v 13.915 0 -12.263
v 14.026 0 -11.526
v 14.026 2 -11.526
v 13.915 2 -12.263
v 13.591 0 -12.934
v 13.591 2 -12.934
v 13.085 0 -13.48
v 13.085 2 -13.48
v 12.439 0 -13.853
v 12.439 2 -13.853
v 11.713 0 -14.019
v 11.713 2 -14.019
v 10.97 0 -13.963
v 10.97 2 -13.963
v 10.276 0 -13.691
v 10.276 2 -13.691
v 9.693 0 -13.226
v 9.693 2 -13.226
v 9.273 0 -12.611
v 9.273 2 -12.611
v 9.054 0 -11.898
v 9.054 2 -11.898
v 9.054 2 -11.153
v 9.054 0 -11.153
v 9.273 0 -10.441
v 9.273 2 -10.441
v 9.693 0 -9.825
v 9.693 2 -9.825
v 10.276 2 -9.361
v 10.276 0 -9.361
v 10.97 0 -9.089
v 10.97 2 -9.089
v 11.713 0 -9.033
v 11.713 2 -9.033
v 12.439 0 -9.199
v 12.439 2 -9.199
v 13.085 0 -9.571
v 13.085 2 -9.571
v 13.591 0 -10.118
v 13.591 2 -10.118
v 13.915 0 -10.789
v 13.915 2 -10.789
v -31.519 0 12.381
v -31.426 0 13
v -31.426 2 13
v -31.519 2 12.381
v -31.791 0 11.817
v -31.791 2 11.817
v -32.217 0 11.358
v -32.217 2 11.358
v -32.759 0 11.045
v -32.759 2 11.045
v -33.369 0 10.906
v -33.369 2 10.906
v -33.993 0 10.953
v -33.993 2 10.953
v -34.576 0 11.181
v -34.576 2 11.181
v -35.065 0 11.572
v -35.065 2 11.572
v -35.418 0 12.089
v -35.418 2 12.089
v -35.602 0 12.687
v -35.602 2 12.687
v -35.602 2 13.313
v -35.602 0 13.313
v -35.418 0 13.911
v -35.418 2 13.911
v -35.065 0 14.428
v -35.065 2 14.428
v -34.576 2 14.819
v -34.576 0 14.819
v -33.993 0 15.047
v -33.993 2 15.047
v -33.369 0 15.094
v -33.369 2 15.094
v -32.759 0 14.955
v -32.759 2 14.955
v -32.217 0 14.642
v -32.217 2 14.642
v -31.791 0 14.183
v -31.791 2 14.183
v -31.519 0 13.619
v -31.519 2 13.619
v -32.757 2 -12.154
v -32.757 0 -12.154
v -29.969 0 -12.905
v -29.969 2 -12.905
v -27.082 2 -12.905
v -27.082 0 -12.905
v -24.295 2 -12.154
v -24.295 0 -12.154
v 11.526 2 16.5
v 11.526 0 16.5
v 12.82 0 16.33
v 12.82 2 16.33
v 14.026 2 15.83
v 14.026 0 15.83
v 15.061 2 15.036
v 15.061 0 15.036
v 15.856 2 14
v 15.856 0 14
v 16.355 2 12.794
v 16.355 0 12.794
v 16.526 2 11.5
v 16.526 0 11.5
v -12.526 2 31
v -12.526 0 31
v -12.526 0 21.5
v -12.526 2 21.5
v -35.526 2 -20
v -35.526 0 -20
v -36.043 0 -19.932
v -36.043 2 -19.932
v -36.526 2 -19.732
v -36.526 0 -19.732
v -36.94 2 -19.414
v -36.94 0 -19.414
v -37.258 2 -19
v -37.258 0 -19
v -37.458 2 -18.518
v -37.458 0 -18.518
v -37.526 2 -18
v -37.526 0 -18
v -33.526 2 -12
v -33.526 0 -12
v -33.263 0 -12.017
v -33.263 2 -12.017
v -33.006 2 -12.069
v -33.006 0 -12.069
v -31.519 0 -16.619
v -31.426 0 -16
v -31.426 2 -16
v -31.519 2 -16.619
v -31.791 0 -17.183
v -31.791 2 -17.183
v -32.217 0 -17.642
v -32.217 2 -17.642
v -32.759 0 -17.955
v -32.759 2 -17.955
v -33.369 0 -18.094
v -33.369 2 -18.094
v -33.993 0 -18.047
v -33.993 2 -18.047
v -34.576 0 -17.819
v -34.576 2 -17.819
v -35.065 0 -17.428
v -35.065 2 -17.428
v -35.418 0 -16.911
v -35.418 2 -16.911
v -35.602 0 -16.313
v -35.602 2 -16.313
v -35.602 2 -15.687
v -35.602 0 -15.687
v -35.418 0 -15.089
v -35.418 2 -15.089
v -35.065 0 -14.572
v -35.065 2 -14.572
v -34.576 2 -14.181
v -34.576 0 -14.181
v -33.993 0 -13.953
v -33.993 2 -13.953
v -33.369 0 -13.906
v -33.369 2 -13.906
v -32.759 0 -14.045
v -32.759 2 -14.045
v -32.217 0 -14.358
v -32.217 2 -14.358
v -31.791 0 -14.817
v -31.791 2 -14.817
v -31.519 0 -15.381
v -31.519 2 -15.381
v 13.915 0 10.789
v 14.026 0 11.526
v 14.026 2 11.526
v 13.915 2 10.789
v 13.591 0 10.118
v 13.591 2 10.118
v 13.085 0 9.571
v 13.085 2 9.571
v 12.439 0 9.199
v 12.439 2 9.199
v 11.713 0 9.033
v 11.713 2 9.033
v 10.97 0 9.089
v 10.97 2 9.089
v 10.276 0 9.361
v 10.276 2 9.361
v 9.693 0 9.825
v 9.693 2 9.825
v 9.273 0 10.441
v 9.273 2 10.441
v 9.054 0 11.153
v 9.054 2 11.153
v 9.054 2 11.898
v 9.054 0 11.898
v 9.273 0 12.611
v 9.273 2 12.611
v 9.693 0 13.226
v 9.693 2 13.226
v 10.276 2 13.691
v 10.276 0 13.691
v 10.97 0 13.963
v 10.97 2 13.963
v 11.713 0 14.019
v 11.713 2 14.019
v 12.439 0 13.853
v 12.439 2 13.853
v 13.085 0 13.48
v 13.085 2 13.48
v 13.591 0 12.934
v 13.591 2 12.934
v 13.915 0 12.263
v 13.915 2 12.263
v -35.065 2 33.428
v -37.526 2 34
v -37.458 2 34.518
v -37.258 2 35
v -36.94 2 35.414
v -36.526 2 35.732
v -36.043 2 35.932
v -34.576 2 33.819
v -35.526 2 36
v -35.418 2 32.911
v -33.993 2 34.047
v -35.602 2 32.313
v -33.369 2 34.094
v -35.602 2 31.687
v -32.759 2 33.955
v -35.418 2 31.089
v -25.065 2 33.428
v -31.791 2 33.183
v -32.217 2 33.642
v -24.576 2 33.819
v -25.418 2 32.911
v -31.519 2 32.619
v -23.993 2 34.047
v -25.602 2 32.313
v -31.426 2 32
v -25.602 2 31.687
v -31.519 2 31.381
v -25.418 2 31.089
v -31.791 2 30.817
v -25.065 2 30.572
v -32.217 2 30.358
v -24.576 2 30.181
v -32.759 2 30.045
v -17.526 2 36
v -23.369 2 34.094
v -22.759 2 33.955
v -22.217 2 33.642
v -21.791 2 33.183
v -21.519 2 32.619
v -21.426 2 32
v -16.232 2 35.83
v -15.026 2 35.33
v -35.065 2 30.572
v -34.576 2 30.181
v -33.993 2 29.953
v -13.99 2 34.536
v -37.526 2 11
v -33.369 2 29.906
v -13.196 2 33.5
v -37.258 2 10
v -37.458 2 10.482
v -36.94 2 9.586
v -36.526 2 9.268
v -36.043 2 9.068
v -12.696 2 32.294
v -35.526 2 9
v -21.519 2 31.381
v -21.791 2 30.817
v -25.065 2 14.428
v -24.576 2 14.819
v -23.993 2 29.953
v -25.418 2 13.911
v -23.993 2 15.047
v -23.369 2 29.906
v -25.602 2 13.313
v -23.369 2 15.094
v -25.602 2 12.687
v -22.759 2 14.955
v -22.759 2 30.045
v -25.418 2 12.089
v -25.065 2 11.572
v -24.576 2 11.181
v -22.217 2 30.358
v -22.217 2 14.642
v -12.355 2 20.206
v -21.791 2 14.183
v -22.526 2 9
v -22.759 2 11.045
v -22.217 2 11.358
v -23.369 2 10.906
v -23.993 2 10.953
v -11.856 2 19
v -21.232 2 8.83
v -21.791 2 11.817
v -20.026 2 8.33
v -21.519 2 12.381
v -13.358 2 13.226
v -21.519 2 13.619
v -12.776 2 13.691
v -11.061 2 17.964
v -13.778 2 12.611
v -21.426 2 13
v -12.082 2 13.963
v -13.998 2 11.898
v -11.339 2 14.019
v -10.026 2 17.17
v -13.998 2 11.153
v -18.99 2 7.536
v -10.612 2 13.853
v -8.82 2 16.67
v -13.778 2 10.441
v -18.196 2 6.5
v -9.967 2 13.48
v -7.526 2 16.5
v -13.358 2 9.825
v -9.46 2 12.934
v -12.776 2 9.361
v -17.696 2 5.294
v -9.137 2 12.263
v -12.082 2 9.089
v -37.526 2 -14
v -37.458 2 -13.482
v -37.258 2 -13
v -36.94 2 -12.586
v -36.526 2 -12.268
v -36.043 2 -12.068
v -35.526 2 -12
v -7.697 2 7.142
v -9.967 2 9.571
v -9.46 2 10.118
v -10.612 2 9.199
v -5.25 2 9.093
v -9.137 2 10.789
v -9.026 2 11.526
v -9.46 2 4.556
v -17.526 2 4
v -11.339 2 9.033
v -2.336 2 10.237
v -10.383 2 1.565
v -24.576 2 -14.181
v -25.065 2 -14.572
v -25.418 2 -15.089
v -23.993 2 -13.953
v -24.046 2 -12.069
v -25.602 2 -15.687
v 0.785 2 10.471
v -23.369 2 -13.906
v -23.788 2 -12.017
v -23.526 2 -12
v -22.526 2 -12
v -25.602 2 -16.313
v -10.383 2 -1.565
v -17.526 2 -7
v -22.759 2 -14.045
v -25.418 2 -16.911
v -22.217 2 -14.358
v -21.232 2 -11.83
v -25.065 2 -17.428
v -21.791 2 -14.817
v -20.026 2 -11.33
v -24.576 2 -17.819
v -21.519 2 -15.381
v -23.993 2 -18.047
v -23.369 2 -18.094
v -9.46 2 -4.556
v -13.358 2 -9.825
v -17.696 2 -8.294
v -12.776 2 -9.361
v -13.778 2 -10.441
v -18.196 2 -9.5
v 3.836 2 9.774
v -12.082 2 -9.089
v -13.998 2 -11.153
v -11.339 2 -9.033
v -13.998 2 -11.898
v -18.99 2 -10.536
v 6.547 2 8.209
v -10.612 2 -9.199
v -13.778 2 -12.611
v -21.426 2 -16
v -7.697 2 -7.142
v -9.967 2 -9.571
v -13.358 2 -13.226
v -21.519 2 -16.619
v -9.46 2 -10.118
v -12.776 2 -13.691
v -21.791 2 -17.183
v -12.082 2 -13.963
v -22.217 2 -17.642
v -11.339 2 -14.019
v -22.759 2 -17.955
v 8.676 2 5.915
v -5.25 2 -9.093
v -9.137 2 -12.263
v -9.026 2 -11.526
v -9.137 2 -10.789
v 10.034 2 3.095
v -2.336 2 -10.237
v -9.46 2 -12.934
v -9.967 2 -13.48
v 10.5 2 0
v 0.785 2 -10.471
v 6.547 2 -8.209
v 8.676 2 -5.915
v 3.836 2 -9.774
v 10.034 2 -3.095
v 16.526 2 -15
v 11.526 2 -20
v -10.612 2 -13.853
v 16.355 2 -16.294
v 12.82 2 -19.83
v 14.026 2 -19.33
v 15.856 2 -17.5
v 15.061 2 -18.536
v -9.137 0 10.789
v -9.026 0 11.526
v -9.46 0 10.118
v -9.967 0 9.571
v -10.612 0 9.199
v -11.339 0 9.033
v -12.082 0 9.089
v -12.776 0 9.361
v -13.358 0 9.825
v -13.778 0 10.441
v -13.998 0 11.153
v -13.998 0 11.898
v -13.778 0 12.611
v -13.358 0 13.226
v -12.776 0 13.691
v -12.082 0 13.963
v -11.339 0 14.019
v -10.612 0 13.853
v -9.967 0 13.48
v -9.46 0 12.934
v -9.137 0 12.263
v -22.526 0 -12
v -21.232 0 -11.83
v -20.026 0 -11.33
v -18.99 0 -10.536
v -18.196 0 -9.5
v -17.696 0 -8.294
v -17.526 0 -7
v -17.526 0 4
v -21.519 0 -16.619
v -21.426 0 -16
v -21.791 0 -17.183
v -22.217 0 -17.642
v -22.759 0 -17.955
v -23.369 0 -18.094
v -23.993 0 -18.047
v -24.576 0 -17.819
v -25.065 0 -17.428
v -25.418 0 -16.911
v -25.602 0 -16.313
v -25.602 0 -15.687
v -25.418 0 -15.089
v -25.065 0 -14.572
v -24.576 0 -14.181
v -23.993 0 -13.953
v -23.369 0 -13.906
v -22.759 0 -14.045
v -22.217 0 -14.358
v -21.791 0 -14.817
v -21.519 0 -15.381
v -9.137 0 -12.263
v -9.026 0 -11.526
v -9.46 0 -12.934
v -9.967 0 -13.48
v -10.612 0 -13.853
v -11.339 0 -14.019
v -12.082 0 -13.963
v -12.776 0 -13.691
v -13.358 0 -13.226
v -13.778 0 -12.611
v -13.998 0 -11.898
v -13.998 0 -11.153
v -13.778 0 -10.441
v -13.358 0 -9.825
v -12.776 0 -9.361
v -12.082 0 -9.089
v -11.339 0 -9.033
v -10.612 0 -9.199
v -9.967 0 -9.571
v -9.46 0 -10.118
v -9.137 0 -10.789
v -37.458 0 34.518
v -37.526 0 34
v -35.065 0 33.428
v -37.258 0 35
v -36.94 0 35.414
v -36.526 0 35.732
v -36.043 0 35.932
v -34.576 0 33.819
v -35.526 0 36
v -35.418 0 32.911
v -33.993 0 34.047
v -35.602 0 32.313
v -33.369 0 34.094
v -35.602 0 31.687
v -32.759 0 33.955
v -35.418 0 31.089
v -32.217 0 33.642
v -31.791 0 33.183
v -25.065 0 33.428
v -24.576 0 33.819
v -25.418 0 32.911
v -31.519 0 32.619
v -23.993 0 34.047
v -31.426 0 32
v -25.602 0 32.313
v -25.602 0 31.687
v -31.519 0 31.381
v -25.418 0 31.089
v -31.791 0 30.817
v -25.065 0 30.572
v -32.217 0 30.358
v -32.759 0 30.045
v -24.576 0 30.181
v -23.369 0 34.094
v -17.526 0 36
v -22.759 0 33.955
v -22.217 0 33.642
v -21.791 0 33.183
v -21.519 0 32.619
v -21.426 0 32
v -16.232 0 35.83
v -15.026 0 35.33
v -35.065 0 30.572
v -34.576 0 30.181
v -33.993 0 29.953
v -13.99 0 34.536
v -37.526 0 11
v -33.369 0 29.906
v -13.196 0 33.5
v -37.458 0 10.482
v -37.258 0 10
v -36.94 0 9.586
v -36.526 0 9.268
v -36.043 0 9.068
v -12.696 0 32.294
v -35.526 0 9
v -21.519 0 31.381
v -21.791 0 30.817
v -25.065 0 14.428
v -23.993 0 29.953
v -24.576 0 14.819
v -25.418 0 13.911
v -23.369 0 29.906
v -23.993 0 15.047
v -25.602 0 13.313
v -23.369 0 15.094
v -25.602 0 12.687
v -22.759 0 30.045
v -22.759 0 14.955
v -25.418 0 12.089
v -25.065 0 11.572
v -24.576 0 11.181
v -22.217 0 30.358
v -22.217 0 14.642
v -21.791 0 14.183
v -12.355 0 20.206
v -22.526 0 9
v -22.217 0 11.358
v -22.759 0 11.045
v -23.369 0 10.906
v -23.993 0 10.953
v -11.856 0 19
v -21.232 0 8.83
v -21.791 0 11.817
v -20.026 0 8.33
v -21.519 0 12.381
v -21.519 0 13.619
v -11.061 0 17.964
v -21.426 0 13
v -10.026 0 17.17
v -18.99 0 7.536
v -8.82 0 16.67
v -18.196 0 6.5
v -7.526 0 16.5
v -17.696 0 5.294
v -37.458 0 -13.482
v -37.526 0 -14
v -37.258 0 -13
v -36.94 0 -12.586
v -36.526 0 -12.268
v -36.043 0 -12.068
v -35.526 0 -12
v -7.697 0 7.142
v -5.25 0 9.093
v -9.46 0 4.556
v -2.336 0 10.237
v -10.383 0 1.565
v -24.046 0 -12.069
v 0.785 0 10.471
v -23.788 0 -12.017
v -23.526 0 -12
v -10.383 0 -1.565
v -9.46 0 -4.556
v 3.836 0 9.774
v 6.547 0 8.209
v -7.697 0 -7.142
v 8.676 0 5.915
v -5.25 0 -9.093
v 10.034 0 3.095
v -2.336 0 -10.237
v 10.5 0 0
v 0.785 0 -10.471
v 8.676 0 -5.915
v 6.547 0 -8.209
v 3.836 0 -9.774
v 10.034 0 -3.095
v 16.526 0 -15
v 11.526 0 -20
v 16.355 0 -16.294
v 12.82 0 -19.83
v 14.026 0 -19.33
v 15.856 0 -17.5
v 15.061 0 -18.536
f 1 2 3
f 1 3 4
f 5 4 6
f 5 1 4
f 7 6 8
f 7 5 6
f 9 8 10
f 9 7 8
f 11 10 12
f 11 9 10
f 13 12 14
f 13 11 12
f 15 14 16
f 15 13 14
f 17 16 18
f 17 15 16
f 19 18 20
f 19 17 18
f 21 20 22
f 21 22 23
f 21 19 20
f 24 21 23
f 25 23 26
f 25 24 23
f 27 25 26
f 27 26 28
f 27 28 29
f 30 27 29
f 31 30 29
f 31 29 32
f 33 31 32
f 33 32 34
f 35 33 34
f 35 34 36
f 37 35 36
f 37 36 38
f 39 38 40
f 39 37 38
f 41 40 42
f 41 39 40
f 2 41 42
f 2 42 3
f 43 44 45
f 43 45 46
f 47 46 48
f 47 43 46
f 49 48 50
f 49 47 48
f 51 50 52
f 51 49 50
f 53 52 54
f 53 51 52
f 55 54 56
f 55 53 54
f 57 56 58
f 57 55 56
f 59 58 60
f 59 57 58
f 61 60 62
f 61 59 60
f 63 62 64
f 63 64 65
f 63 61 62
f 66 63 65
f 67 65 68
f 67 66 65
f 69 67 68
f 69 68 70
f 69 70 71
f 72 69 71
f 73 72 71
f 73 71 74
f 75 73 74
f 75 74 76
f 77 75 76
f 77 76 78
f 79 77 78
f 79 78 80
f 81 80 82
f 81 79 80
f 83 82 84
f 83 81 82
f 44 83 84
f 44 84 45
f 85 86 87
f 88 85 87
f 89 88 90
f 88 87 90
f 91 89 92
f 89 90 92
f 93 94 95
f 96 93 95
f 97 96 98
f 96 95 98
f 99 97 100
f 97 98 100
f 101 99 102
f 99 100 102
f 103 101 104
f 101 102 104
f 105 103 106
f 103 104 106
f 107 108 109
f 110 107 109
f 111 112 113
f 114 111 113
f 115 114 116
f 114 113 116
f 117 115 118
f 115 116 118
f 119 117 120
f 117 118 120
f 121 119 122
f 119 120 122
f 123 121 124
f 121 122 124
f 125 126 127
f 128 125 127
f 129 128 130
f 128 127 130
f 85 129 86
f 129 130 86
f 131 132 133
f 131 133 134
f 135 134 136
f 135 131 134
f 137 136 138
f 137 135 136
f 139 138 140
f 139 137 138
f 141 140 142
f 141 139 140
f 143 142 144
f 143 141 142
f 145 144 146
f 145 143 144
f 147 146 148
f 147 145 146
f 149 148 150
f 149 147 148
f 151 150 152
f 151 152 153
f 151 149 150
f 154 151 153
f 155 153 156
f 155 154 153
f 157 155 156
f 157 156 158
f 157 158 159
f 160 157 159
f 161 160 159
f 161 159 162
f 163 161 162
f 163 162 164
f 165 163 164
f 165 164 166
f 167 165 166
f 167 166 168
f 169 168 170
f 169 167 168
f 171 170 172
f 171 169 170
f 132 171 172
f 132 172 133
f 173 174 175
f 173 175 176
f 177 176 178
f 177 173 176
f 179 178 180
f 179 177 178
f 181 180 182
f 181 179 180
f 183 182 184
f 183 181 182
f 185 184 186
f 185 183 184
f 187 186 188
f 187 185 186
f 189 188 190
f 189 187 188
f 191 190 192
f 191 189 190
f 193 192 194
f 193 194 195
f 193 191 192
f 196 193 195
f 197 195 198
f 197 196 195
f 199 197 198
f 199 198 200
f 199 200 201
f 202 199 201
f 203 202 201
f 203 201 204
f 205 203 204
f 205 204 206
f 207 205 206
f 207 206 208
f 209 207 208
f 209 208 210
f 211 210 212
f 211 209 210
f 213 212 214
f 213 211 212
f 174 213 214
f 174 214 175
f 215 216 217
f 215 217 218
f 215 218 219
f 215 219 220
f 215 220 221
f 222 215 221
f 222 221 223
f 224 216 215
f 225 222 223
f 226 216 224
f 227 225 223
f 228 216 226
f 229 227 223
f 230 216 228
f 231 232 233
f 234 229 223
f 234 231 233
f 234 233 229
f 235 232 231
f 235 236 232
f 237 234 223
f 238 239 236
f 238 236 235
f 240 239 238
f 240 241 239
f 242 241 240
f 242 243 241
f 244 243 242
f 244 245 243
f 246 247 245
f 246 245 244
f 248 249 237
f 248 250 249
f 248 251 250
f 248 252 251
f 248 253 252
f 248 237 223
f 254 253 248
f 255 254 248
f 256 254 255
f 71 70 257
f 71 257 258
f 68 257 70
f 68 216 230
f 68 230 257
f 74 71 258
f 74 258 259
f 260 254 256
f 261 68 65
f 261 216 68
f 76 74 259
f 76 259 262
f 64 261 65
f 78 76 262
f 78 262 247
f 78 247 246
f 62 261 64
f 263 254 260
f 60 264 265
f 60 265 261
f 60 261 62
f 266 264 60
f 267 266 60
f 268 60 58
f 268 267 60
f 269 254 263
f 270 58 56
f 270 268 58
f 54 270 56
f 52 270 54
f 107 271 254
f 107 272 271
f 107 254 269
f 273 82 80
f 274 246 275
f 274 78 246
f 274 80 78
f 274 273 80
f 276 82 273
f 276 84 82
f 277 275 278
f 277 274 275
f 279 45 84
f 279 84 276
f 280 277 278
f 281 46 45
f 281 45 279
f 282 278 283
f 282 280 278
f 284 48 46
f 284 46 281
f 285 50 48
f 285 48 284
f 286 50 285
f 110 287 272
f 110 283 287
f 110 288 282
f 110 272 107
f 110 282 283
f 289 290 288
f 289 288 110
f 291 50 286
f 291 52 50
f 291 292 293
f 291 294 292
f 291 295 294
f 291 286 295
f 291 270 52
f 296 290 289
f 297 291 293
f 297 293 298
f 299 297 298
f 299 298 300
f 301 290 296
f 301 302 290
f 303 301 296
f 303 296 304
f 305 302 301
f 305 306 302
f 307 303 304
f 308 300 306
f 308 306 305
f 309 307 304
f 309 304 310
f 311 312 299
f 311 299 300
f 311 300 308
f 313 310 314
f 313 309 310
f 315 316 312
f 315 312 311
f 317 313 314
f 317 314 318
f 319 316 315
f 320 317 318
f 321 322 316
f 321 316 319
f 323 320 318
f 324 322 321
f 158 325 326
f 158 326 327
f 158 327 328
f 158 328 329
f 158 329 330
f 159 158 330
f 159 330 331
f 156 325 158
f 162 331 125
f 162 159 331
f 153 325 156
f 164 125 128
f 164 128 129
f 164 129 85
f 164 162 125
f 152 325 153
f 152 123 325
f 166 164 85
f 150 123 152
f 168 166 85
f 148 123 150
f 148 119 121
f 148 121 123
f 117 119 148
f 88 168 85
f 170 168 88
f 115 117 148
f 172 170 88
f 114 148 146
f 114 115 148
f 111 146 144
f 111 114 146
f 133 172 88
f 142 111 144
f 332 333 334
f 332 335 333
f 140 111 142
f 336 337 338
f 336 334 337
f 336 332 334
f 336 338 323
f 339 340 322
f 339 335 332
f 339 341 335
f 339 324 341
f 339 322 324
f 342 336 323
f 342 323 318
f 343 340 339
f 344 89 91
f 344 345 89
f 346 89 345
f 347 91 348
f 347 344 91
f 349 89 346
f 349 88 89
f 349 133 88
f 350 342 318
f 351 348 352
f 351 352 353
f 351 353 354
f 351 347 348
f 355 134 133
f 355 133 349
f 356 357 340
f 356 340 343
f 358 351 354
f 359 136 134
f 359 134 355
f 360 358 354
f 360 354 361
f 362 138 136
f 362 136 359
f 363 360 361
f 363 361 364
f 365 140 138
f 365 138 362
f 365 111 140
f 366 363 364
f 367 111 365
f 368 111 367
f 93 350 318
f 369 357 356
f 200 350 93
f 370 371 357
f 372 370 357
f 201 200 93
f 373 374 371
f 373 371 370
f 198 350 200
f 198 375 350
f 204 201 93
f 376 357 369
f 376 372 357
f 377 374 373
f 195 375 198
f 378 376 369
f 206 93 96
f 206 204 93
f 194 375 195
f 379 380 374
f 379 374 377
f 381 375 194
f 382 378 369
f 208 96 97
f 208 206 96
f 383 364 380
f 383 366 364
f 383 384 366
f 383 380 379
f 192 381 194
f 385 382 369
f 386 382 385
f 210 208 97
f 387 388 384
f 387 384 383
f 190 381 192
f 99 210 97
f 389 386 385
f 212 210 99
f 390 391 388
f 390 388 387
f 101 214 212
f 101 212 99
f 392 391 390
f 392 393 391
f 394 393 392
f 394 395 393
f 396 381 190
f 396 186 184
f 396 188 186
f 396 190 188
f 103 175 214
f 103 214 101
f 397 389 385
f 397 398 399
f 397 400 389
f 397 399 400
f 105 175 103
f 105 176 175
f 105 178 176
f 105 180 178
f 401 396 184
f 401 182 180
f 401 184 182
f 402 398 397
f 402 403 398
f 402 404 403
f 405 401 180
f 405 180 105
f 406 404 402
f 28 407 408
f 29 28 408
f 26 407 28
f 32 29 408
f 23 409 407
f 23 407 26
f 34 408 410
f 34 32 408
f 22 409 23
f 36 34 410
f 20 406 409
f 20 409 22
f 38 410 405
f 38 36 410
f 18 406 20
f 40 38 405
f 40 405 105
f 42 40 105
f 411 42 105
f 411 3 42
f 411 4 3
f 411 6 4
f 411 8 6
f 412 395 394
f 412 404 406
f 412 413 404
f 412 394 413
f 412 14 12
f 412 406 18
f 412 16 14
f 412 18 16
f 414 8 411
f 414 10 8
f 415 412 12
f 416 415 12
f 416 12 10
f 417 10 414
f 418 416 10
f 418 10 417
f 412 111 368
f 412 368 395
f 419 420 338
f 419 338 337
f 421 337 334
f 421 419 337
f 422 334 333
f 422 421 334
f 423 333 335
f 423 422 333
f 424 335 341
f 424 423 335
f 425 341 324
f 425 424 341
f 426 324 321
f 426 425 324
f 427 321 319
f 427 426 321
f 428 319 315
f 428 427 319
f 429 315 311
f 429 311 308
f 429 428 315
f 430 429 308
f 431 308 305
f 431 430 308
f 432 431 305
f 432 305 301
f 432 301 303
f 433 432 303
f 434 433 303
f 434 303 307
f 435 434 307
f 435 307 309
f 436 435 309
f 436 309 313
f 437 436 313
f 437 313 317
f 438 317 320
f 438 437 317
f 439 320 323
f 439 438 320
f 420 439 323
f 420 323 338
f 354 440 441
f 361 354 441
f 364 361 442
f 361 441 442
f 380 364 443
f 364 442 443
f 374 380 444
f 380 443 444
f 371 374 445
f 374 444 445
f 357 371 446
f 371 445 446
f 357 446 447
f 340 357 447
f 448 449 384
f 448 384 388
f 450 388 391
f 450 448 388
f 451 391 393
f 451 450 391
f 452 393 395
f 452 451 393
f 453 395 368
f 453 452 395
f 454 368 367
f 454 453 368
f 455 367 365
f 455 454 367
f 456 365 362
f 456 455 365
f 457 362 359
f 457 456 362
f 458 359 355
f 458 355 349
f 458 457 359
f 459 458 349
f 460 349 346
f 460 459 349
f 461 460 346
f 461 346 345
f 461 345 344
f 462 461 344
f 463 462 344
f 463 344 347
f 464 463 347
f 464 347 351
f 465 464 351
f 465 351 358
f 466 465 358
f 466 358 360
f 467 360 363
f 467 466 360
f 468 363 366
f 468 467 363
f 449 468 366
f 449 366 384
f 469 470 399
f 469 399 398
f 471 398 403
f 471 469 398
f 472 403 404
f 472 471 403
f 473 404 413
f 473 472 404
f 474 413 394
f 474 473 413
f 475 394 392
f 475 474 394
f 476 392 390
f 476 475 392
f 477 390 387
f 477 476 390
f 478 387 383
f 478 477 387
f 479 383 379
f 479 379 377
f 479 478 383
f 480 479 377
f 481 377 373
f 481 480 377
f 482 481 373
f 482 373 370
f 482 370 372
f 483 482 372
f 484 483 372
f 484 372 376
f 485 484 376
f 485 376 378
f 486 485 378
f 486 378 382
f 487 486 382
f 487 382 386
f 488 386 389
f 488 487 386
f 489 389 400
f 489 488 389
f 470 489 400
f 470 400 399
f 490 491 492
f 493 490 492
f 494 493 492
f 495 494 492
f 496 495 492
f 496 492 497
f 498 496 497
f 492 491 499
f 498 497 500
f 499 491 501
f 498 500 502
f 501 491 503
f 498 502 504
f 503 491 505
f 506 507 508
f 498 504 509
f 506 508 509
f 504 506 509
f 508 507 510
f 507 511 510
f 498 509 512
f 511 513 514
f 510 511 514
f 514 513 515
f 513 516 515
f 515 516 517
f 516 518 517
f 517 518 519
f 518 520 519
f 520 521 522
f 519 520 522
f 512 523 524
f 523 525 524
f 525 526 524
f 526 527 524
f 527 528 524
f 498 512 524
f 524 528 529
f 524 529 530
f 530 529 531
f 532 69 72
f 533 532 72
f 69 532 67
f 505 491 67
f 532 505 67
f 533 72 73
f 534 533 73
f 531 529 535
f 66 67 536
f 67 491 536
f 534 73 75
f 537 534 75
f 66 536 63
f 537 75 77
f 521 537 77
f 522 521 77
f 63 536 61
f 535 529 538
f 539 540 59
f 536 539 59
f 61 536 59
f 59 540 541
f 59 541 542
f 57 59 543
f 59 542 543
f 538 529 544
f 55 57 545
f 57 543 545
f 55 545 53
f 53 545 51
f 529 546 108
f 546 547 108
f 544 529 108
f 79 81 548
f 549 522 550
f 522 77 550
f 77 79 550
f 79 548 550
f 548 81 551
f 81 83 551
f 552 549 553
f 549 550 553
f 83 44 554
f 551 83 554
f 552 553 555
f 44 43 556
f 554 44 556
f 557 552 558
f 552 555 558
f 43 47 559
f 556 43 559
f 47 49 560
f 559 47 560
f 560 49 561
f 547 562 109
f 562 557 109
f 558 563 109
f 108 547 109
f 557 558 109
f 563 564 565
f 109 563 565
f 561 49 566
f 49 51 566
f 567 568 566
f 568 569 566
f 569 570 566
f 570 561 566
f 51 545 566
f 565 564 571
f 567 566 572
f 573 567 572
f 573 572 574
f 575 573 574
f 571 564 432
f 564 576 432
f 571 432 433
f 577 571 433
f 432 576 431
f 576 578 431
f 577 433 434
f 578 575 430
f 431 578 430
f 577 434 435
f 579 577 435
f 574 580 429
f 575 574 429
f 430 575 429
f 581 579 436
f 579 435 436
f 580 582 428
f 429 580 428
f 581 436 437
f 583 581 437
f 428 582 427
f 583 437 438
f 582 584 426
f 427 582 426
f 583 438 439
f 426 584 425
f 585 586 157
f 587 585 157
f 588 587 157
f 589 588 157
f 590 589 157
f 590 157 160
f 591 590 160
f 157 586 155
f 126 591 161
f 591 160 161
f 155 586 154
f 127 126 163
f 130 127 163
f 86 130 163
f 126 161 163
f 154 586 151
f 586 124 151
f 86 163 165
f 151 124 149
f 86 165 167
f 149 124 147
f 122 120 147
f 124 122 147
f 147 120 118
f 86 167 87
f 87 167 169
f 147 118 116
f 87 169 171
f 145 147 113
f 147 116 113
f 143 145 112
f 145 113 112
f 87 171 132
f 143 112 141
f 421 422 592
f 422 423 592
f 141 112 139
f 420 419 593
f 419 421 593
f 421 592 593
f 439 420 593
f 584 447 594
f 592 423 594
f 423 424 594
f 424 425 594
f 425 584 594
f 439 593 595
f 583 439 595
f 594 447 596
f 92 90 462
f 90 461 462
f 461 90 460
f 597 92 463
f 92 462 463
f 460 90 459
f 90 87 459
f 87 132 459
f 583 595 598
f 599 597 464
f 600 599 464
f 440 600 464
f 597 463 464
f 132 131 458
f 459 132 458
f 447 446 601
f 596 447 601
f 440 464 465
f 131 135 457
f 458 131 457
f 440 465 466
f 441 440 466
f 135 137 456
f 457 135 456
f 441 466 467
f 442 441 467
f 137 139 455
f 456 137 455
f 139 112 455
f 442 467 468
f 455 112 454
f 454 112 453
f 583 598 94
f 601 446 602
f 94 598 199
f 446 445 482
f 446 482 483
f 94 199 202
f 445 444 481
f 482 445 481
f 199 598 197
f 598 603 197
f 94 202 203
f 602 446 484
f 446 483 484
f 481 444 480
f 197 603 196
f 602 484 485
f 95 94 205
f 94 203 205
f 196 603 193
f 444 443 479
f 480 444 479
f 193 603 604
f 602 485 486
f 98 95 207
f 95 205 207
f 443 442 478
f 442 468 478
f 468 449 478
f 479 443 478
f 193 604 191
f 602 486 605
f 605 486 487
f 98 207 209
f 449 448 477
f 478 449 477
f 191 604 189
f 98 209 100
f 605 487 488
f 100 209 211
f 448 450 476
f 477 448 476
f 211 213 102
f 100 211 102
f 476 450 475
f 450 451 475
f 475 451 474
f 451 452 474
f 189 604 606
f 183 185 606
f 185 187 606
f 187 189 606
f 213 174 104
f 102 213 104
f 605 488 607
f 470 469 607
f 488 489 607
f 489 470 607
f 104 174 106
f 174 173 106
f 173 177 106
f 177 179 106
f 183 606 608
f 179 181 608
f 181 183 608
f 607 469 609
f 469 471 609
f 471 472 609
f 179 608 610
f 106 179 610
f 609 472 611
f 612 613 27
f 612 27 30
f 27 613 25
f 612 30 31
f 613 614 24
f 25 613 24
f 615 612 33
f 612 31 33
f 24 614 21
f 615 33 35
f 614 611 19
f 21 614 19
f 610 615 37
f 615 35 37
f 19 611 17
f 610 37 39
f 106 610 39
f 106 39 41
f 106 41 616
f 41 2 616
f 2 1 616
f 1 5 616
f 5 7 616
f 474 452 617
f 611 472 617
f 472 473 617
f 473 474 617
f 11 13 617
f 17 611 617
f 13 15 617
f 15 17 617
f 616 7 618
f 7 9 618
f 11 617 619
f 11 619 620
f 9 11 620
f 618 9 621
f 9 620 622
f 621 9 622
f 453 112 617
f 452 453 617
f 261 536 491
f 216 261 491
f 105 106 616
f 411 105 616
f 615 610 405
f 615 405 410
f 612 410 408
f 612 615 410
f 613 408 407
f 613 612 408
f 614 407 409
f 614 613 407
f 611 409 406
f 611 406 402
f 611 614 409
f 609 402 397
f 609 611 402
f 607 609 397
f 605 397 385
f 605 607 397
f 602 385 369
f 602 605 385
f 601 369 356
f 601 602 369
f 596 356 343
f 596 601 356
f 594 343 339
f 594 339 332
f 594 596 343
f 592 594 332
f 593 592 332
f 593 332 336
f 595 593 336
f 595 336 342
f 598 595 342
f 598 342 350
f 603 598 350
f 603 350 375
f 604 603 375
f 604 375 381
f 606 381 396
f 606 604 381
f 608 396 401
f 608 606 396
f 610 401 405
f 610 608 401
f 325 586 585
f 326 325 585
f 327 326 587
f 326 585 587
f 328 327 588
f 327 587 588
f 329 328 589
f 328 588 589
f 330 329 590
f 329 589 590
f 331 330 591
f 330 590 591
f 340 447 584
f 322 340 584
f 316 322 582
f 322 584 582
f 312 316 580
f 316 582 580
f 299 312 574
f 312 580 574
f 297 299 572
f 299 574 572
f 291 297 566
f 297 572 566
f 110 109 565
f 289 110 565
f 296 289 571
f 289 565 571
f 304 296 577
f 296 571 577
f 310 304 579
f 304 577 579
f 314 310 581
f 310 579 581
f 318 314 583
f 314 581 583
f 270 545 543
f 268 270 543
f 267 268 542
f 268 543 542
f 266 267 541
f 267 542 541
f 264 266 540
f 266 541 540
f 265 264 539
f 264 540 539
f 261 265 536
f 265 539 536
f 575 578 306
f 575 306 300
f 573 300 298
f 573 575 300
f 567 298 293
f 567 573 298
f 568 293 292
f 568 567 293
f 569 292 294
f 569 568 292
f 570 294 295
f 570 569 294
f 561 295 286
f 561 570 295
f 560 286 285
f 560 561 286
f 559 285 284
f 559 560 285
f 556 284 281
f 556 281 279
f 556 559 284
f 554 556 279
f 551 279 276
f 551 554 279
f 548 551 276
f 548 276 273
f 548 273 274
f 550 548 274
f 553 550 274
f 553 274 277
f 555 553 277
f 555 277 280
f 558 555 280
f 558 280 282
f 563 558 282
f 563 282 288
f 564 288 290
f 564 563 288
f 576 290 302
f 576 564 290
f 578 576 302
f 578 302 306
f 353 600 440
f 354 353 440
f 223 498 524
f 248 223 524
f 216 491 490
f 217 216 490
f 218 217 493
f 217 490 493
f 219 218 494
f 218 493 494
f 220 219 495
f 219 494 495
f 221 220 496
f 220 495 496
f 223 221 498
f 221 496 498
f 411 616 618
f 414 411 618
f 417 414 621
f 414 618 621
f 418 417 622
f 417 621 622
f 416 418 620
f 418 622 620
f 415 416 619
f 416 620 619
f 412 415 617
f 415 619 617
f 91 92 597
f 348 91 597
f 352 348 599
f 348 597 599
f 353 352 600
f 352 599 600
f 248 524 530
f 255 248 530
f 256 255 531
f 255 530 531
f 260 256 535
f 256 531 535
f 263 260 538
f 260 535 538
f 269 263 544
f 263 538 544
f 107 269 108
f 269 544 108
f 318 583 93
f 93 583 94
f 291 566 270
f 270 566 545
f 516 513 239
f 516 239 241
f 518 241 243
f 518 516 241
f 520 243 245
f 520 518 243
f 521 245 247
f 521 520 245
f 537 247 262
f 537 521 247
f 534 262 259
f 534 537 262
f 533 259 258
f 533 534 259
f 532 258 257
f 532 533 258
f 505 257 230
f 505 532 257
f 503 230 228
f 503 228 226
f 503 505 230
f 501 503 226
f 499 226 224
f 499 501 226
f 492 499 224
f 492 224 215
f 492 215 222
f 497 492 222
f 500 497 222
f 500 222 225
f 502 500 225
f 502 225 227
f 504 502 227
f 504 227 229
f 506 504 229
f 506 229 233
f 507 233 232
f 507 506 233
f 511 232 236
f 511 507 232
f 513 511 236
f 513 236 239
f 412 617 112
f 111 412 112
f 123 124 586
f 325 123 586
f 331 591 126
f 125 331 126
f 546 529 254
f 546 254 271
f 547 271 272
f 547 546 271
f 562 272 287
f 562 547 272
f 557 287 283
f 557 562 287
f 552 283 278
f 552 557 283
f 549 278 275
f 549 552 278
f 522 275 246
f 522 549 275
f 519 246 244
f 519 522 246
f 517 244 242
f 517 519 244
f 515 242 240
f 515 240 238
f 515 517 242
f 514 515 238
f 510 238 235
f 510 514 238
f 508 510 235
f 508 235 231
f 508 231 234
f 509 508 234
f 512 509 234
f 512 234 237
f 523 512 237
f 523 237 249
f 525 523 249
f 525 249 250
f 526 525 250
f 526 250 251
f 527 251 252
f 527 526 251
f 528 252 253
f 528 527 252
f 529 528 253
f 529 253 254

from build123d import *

# Parameters (mm, degrees)
SKETCH1_R           = 2.5
SKETCH1_R_2         = 2.1
SKETCH1_R_3         = 10.5
BOSS_EXTRUDE1_DEPTH = 2


with BuildPart() as part:
    # Sketch1 → Boss-Extrude1 (new body)
    with BuildSketch(Plane(origin=(0, 0, 0), x_dir=(1, 0, 0), z_dir=(0, 1, 0))):
        with BuildLine():
            Line((-35.525840533, 12), (-33.525840533, 12))
            ThreePointArc((-33.525840533, 12), (-33.133608263, 12.038838649), (-32.756609764, 12.153846154))
            ThreePointArc((-32.756609764, 12.153846154), (-28.525840533, 13), (-24.295071303, 12.153846154))
            ThreePointArc((-24.295071303, 12.153846154), (-23.918072804, 12.038838649), (-23.525840533, 12))
            Line((-23.525840533, 12), (-22.525840533, 12))
            ThreePointArc((-22.525840533, 12), (-18.990306627, 10.535533906), (-17.525840533, 7))
            Line((-17.525840533, 7), (-17.525840533, -4))
            ThreePointArc((-17.525840533, -4), (-18.990306627, -7.535533906), (-22.525840533, -9))
            Line((-22.525840533, -9), (-35.525840533, -9))
            ThreePointArc((-35.525840533, -9), (-36.940054096, -9.585786438), (-37.525840533, -11))
            Line((-37.525840533, -11), (-37.525840533, -34))
            ThreePointArc((-37.525840533, -34), (-36.940054096, -35.414213562), (-35.525840533, -36))
            Line((-35.525840533, -36), (-17.525840533, -36))
            ThreePointArc((-17.525840533, -36), (-13.990306627, -34.535533906), (-12.525840533, -31))
            Line((-12.525840533, -31), (-12.525840533, -21.5))
            ThreePointArc((-12.525840533, -21.5), (-11.061374439, -17.964466094), (-7.525840533, -16.5))
            Line((-7.525840533, -16.5), (11.525840533, -16.5))
            ThreePointArc((11.525840533, -16.5), (15.061374439, -15.035533906), (16.525840533, -11.5))
            Line((16.525840533, -11.5), (16.525840533, 15))
            ThreePointArc((16.525840533, 15), (15.061374439, 18.535533906), (11.525840533, 20))
            Line((11.525840533, 20), (-35.525840533, 20))
            ThreePointArc((-35.525840533, 20), (-36.940054096, 19.414213562), (-37.525840533, 18))
            Line((-37.525840533, 18), (-37.525840533, 14))
            ThreePointArc((-37.525840533, 14), (-36.940054096, 12.585786438), (-35.525840533, 12))
        make_face()
        with Locations((-11.525840533, 11.525840533)):
            Circle(SKETCH1_R, mode=Mode.SUBTRACT)
        with Locations((11.525840533, 11.525840533)):
            Circle(SKETCH1_R, mode=Mode.SUBTRACT)
        with Locations((11.525840533, -11.525840533)):
            Circle(SKETCH1_R, mode=Mode.SUBTRACT)
        with Locations((-11.525840533, -11.525840533)):
            Circle(SKETCH1_R, mode=Mode.SUBTRACT)
        with Locations((-33.525840533, 16)):
            Circle(SKETCH1_R_2, mode=Mode.SUBTRACT)
        with Locations((-23.525840533, 16)):
            Circle(SKETCH1_R_2, mode=Mode.SUBTRACT)
        with Locations((-33.525840533, -32)):
            Circle(SKETCH1_R_2, mode=Mode.SUBTRACT)
        with Locations((-23.525840533, -32)):
            Circle(SKETCH1_R_2, mode=Mode.SUBTRACT)
        with Locations((-33.525840533, -13)):
            Circle(SKETCH1_R_2, mode=Mode.SUBTRACT)
        with Locations((-23.525840533, -13)):
            Circle(SKETCH1_R_2, mode=Mode.SUBTRACT)
        Circle(SKETCH1_R_3, mode=Mode.SUBTRACT)
    extrude(amount=BOSS_EXTRUDE1_DEPTH)


solid = part.part
